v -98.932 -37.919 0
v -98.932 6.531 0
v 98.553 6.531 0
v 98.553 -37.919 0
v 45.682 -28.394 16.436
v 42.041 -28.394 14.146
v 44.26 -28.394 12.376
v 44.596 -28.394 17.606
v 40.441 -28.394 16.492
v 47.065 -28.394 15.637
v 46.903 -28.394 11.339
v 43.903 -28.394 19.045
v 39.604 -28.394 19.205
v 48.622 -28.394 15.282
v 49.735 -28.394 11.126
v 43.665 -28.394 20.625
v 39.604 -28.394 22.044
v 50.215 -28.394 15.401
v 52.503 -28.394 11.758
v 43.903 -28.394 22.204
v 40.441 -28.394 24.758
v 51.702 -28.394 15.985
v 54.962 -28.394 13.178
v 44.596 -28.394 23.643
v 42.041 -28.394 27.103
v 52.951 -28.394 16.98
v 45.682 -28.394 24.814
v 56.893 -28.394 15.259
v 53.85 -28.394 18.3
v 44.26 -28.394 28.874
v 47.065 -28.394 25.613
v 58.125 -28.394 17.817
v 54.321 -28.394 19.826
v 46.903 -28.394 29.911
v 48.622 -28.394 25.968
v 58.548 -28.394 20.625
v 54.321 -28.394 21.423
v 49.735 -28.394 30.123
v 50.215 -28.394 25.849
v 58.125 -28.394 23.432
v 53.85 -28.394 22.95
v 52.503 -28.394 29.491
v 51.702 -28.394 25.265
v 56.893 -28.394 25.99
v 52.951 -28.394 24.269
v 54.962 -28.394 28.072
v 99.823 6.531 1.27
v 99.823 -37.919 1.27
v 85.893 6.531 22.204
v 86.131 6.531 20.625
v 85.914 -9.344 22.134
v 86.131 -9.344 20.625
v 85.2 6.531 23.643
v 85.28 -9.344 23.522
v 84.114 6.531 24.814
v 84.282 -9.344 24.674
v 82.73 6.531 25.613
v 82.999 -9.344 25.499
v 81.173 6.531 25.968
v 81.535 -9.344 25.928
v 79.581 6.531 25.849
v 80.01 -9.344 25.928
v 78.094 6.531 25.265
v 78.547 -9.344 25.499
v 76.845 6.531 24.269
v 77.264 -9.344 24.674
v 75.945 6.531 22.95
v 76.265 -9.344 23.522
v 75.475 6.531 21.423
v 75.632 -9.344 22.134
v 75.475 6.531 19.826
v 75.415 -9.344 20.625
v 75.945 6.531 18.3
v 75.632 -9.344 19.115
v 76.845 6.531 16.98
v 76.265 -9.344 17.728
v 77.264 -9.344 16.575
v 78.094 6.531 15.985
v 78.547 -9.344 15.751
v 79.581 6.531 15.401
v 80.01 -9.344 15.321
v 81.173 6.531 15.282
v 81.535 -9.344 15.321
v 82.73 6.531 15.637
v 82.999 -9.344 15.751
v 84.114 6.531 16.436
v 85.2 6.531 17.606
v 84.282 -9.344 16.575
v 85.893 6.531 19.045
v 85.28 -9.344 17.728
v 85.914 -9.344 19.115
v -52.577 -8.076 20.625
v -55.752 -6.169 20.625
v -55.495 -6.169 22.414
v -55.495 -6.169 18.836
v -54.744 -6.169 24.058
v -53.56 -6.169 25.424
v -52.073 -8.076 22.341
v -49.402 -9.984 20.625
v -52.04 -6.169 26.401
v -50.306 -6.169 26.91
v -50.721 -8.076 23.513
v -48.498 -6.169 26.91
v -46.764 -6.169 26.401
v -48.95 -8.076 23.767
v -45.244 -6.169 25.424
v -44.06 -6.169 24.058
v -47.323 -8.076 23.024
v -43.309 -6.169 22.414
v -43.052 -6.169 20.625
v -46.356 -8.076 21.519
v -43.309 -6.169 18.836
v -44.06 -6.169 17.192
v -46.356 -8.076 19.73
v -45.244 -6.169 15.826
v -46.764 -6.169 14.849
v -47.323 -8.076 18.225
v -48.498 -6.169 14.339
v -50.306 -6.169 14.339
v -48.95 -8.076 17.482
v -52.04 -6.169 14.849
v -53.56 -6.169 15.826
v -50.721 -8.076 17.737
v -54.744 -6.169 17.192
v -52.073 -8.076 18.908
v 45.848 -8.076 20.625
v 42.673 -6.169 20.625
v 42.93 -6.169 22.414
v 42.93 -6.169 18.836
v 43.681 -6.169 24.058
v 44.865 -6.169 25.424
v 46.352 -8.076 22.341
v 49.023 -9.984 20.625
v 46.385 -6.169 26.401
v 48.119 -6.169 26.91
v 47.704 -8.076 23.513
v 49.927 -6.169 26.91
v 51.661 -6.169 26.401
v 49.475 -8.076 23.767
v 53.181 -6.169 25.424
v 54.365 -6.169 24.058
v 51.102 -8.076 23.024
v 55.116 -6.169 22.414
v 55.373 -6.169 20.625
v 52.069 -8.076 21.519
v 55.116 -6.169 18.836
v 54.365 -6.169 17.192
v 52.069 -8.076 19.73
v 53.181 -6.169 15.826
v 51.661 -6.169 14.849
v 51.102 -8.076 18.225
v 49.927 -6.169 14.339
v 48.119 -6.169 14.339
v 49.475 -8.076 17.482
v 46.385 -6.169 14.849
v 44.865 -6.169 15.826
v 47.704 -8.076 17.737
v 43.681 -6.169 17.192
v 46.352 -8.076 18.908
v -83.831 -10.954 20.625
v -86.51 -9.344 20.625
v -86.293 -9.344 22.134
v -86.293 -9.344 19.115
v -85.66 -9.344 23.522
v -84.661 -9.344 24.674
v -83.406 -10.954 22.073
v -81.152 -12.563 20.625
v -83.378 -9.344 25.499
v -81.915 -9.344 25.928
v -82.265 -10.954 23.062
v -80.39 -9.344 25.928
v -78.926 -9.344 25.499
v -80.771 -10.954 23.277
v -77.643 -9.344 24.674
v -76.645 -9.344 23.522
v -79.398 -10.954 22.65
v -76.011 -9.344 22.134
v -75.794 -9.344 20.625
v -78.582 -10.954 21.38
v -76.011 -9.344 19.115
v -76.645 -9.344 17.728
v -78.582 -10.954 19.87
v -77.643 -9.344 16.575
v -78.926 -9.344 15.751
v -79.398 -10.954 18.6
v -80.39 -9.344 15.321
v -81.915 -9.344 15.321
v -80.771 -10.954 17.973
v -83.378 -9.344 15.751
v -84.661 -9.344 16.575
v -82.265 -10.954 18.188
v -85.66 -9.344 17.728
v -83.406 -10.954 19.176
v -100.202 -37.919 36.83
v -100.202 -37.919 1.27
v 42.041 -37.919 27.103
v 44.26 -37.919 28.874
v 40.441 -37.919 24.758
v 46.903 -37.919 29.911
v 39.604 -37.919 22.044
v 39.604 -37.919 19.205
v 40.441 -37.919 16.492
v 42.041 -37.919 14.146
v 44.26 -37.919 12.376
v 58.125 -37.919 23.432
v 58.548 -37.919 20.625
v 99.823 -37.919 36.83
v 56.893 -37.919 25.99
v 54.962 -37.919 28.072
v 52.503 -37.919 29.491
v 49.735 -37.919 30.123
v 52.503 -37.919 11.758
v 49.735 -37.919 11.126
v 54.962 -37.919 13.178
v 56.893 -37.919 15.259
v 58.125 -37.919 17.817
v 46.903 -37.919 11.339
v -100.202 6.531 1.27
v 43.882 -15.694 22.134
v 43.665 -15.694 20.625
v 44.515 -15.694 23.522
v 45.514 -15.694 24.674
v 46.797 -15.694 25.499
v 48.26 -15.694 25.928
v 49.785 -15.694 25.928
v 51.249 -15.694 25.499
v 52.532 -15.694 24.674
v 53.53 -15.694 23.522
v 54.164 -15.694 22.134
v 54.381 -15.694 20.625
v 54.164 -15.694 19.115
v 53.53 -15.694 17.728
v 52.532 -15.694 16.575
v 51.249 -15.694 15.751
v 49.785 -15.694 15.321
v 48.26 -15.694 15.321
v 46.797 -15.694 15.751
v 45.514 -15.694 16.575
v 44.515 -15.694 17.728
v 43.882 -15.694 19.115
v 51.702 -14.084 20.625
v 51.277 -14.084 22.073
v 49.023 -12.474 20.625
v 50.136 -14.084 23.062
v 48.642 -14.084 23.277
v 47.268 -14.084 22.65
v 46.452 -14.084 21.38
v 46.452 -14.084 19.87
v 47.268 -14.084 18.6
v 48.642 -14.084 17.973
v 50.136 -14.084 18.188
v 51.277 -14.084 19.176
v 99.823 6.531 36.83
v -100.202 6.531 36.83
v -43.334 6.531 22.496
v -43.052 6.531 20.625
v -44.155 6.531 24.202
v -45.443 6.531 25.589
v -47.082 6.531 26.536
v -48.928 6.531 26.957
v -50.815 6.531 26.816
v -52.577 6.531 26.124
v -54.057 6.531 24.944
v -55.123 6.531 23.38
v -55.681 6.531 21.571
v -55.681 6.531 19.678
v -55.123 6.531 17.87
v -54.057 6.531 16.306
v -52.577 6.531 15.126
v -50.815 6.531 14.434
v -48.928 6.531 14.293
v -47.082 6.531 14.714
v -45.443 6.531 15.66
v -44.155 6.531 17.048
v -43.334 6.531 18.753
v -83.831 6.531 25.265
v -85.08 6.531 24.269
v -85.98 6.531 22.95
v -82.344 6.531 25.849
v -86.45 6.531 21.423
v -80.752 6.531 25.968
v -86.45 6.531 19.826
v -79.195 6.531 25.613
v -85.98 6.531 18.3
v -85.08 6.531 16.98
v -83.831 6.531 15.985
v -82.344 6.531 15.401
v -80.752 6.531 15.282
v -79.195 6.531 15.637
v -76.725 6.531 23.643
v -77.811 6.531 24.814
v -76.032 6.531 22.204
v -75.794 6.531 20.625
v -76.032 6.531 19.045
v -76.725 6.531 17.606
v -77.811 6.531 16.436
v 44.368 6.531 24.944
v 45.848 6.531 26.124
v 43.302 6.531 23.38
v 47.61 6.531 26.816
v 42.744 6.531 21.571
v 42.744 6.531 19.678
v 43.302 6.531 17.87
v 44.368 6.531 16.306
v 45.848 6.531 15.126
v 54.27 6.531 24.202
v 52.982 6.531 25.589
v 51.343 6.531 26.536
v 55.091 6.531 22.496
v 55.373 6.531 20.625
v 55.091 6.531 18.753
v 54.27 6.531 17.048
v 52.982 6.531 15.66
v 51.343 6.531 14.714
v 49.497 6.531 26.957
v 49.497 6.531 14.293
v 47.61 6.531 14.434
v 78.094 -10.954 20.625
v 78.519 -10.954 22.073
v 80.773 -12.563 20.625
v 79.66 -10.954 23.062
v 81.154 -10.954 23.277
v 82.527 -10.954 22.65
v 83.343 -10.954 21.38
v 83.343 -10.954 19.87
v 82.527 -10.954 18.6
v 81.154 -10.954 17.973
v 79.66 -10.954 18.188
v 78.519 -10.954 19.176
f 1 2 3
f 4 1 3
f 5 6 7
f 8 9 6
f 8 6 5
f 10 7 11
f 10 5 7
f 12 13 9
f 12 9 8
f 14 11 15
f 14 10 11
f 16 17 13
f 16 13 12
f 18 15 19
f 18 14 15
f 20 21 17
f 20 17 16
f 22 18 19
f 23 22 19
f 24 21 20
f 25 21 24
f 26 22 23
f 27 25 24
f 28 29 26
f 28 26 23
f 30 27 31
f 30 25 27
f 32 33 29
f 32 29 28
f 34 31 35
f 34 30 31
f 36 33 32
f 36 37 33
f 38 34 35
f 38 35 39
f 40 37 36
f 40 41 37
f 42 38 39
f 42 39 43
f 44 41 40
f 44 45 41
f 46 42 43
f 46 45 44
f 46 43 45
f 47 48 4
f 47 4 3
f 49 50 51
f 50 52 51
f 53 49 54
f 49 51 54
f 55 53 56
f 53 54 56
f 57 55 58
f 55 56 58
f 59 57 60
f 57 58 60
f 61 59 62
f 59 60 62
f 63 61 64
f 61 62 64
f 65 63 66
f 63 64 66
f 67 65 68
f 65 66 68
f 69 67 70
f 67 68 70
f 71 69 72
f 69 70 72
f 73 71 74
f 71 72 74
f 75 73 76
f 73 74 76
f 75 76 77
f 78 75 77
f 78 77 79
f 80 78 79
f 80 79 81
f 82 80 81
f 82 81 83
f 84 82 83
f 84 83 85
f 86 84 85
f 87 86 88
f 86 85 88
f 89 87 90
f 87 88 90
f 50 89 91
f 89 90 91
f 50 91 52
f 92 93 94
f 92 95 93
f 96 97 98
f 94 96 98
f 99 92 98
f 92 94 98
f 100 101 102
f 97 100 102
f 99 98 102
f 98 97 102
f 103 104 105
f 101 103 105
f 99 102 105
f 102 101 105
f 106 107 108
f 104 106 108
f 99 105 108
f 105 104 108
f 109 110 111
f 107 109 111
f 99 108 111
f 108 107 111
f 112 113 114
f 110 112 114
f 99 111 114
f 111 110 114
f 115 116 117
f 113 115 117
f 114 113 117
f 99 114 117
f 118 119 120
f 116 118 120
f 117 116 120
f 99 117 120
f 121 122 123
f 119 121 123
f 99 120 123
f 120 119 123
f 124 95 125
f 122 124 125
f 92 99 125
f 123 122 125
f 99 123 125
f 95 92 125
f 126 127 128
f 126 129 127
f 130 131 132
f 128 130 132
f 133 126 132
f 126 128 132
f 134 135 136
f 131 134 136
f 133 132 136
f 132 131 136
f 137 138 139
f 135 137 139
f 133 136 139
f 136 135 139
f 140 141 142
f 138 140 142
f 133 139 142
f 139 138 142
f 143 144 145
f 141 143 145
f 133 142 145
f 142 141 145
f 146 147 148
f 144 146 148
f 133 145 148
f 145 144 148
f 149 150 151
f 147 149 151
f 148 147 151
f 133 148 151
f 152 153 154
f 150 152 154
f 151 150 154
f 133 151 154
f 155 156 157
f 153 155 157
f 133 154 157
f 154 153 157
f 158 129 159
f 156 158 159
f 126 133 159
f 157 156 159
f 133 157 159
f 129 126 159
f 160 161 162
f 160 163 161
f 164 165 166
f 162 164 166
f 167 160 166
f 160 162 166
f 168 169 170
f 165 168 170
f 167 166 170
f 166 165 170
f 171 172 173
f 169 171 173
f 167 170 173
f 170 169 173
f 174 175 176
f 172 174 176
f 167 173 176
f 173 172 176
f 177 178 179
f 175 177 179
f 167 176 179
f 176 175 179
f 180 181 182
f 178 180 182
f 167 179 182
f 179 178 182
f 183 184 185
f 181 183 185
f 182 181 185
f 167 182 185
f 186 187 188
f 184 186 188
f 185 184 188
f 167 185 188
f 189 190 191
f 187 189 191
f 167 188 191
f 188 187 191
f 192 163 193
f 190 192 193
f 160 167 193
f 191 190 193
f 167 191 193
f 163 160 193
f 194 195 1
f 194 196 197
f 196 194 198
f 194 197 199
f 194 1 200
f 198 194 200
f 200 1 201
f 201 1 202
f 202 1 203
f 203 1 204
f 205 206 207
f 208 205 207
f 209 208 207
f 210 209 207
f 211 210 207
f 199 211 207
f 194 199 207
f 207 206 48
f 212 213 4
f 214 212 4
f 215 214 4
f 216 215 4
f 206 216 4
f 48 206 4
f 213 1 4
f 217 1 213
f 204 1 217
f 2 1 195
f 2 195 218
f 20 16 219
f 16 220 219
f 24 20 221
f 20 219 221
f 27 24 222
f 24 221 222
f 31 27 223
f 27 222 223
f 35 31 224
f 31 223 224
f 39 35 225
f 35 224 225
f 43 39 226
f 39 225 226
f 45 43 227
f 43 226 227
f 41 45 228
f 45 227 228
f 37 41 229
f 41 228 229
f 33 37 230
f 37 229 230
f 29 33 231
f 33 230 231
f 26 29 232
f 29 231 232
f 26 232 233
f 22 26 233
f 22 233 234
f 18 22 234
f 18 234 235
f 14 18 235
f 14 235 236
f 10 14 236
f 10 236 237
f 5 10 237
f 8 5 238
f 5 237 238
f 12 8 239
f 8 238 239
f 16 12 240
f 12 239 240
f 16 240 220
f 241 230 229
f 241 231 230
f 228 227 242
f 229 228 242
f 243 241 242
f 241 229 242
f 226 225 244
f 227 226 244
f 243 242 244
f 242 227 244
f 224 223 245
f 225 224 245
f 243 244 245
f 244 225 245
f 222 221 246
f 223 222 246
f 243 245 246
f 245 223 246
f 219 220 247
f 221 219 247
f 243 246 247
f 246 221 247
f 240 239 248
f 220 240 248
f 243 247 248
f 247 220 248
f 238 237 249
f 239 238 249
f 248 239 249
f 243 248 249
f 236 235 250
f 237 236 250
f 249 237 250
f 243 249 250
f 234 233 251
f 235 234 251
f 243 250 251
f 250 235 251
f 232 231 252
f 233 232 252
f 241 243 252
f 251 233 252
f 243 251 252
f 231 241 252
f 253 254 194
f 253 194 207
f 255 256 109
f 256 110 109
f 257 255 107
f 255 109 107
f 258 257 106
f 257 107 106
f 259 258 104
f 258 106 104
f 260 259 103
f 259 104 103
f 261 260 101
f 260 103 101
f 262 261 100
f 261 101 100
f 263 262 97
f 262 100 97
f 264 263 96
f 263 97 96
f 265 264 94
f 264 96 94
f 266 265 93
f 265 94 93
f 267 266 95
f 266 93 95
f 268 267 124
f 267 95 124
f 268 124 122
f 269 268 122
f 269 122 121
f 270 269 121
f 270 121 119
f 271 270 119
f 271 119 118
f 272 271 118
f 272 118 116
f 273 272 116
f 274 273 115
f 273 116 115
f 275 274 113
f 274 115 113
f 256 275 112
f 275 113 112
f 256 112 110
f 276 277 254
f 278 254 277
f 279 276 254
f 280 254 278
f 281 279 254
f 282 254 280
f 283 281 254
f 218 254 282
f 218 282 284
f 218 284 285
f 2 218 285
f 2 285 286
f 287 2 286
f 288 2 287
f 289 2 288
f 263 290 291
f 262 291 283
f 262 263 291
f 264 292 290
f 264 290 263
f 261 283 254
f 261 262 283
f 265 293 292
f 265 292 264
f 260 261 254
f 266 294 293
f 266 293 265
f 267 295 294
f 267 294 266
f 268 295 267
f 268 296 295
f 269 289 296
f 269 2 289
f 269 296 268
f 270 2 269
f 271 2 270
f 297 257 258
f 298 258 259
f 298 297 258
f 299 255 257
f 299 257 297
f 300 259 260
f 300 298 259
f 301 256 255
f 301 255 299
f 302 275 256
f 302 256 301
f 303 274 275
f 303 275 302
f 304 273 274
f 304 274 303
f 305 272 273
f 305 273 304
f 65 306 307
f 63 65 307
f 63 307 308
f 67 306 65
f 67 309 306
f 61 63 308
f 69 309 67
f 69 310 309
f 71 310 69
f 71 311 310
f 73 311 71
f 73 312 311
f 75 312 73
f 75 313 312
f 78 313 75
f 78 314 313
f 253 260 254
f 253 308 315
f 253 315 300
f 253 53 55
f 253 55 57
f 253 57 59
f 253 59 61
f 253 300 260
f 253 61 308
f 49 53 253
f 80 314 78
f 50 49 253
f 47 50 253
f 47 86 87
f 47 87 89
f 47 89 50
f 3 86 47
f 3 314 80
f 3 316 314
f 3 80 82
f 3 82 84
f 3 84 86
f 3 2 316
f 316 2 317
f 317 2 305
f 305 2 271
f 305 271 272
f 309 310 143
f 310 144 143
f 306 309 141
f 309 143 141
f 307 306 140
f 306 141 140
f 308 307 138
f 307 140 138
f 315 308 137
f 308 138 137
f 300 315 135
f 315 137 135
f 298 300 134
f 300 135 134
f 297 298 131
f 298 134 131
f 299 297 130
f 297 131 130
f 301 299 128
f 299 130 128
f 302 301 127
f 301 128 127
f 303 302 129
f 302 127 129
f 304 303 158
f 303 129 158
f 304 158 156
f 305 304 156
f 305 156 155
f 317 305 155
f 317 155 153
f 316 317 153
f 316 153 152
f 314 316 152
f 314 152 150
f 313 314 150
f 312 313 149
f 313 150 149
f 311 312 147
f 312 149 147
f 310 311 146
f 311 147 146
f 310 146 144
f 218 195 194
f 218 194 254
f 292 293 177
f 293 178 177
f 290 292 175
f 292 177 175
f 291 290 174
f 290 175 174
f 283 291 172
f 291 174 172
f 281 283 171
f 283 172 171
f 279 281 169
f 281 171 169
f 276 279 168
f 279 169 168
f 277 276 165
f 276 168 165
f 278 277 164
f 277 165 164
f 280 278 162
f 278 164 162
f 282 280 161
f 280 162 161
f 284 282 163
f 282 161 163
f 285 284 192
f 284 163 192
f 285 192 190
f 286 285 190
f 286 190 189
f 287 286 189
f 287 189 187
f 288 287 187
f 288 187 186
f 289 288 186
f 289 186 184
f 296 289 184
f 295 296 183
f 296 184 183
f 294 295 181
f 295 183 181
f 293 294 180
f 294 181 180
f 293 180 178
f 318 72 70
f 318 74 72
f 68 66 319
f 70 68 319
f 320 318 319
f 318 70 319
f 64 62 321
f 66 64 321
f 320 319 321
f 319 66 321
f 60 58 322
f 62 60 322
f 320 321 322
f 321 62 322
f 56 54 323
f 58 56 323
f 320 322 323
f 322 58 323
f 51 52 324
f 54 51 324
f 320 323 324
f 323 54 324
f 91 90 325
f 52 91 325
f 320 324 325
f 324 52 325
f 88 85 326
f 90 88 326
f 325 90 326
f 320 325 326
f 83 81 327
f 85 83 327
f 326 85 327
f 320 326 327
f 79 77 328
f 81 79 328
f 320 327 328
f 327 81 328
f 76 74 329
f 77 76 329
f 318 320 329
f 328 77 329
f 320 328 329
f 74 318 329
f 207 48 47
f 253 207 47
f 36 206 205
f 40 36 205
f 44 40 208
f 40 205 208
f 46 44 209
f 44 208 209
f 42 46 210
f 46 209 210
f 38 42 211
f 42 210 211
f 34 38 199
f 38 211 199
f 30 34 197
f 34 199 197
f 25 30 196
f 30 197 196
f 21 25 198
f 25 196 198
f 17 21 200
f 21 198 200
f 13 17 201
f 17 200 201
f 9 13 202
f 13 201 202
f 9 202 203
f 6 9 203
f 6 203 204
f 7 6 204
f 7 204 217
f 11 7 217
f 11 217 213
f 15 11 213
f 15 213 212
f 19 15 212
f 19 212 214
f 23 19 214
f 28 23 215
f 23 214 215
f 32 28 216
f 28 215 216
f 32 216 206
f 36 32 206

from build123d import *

# Parameters (mm, degrees)
F0_W      = 200.025
F0_H      = 76.2
F1_DEPTH  = 36.83
F2_DEPTH  = 31.75
F4_D      = 10.71626
F4_DEPTH  = 15.875
F4_TIP    = 3.2194893086
F5_D      = 12.7
F5_DEPTH  = 12.7
F5_TIP    = 3.8154649308
F6_SIZE   = 1.27
F7_R      = 9.525
F8_DEPTH  = 9.525
F10_D     = 10.71626
F10_DEPTH = 12.7
F10_TIP   = 3.2194893086


# Not quite as in the source:
# - a length typed as a fraction of an inch, garbled in the dataset ("3 / 203.2 mm" for 3/8 in), is restored
# - a feature names something its author has since deleted; it is built from what else it names


with BuildPart() as f1:
    # F0 (on Top) → F1 (new body)
    with BuildSketch(Plane.XY):
        with Locations((-0.1895949244, 0.1812406208)):
            Rectangle(F0_W, F0_H)
    extrude(amount=F1_DEPTH)

    # F2 (cut): a face of the model
    f2_faces = [f1.faces().sort_by_distance(p)[0] for p in [
        (-0.1895949244, 38.2812406208, 18.415),
    ]]
    extrude(f2_faces, amount=-F2_DEPTH, mode=Mode.SUBTRACT)

    # F4
    with Locations(Plane(origin=(0, 6.5312406208, 0), x_dir=(-1, 0, 0), z_dir=(0, 1, 0))):
        with Locations((-80.7729050756, 20.6248), (81.1520949244, 20.6248)):
            Hole(F4_D / 2, depth=F4_DEPTH)
            with Locations((0, 0, -(F4_DEPTH + F4_TIP / 2))):  # 118° drill point
                Cone(0, F4_D / 2, F4_TIP, mode=Mode.SUBTRACT)

    # F5
    with Locations(Plane(origin=(0, 6.5312406208, 0), x_dir=(-1, 0, 0), z_dir=(0, 1, 0))):
        with Locations((-49.0229050756, 20.6248), (49.4020949244, 20.6248)):
            Hole(F5_D / 2, depth=F5_DEPTH)
            with Locations((0, 0, -(F5_DEPTH + F5_TIP / 2))):  # 118° drill point
                Cone(0, F5_D / 2, F5_TIP, mode=Mode.SUBTRACT)

    # F6
    f6_edges = [f1.edges().sort_by_distance(p)[0] for p in [
        (-100.202095, -15.693759, 0),
        (99.822905, -15.693759, 0),
    ]]
    chamfer(f6_edges, length=F6_SIZE)

    # F7 (on face) → F8 (cut)
    with BuildSketch(Plane.XZ.offset(37.9187593792)):
        with Locations((49.0229050756, 20.6248)):
            Circle(F7_R)
    extrude(amount=-F8_DEPTH, mode=Mode.SUBTRACT)

    # F10
    with Locations(Plane.XZ.offset(28.3937593792)):
        with Locations((49.0229050756, 20.6248)):
            Hole(F10_D / 2, depth=F10_DEPTH)
            with Locations((0, 0, -(F10_DEPTH + F10_TIP / 2))):  # 118° drill point
                Cone(0, F10_D / 2, F10_TIP, mode=Mode.SUBTRACT)


solid = f1.part
